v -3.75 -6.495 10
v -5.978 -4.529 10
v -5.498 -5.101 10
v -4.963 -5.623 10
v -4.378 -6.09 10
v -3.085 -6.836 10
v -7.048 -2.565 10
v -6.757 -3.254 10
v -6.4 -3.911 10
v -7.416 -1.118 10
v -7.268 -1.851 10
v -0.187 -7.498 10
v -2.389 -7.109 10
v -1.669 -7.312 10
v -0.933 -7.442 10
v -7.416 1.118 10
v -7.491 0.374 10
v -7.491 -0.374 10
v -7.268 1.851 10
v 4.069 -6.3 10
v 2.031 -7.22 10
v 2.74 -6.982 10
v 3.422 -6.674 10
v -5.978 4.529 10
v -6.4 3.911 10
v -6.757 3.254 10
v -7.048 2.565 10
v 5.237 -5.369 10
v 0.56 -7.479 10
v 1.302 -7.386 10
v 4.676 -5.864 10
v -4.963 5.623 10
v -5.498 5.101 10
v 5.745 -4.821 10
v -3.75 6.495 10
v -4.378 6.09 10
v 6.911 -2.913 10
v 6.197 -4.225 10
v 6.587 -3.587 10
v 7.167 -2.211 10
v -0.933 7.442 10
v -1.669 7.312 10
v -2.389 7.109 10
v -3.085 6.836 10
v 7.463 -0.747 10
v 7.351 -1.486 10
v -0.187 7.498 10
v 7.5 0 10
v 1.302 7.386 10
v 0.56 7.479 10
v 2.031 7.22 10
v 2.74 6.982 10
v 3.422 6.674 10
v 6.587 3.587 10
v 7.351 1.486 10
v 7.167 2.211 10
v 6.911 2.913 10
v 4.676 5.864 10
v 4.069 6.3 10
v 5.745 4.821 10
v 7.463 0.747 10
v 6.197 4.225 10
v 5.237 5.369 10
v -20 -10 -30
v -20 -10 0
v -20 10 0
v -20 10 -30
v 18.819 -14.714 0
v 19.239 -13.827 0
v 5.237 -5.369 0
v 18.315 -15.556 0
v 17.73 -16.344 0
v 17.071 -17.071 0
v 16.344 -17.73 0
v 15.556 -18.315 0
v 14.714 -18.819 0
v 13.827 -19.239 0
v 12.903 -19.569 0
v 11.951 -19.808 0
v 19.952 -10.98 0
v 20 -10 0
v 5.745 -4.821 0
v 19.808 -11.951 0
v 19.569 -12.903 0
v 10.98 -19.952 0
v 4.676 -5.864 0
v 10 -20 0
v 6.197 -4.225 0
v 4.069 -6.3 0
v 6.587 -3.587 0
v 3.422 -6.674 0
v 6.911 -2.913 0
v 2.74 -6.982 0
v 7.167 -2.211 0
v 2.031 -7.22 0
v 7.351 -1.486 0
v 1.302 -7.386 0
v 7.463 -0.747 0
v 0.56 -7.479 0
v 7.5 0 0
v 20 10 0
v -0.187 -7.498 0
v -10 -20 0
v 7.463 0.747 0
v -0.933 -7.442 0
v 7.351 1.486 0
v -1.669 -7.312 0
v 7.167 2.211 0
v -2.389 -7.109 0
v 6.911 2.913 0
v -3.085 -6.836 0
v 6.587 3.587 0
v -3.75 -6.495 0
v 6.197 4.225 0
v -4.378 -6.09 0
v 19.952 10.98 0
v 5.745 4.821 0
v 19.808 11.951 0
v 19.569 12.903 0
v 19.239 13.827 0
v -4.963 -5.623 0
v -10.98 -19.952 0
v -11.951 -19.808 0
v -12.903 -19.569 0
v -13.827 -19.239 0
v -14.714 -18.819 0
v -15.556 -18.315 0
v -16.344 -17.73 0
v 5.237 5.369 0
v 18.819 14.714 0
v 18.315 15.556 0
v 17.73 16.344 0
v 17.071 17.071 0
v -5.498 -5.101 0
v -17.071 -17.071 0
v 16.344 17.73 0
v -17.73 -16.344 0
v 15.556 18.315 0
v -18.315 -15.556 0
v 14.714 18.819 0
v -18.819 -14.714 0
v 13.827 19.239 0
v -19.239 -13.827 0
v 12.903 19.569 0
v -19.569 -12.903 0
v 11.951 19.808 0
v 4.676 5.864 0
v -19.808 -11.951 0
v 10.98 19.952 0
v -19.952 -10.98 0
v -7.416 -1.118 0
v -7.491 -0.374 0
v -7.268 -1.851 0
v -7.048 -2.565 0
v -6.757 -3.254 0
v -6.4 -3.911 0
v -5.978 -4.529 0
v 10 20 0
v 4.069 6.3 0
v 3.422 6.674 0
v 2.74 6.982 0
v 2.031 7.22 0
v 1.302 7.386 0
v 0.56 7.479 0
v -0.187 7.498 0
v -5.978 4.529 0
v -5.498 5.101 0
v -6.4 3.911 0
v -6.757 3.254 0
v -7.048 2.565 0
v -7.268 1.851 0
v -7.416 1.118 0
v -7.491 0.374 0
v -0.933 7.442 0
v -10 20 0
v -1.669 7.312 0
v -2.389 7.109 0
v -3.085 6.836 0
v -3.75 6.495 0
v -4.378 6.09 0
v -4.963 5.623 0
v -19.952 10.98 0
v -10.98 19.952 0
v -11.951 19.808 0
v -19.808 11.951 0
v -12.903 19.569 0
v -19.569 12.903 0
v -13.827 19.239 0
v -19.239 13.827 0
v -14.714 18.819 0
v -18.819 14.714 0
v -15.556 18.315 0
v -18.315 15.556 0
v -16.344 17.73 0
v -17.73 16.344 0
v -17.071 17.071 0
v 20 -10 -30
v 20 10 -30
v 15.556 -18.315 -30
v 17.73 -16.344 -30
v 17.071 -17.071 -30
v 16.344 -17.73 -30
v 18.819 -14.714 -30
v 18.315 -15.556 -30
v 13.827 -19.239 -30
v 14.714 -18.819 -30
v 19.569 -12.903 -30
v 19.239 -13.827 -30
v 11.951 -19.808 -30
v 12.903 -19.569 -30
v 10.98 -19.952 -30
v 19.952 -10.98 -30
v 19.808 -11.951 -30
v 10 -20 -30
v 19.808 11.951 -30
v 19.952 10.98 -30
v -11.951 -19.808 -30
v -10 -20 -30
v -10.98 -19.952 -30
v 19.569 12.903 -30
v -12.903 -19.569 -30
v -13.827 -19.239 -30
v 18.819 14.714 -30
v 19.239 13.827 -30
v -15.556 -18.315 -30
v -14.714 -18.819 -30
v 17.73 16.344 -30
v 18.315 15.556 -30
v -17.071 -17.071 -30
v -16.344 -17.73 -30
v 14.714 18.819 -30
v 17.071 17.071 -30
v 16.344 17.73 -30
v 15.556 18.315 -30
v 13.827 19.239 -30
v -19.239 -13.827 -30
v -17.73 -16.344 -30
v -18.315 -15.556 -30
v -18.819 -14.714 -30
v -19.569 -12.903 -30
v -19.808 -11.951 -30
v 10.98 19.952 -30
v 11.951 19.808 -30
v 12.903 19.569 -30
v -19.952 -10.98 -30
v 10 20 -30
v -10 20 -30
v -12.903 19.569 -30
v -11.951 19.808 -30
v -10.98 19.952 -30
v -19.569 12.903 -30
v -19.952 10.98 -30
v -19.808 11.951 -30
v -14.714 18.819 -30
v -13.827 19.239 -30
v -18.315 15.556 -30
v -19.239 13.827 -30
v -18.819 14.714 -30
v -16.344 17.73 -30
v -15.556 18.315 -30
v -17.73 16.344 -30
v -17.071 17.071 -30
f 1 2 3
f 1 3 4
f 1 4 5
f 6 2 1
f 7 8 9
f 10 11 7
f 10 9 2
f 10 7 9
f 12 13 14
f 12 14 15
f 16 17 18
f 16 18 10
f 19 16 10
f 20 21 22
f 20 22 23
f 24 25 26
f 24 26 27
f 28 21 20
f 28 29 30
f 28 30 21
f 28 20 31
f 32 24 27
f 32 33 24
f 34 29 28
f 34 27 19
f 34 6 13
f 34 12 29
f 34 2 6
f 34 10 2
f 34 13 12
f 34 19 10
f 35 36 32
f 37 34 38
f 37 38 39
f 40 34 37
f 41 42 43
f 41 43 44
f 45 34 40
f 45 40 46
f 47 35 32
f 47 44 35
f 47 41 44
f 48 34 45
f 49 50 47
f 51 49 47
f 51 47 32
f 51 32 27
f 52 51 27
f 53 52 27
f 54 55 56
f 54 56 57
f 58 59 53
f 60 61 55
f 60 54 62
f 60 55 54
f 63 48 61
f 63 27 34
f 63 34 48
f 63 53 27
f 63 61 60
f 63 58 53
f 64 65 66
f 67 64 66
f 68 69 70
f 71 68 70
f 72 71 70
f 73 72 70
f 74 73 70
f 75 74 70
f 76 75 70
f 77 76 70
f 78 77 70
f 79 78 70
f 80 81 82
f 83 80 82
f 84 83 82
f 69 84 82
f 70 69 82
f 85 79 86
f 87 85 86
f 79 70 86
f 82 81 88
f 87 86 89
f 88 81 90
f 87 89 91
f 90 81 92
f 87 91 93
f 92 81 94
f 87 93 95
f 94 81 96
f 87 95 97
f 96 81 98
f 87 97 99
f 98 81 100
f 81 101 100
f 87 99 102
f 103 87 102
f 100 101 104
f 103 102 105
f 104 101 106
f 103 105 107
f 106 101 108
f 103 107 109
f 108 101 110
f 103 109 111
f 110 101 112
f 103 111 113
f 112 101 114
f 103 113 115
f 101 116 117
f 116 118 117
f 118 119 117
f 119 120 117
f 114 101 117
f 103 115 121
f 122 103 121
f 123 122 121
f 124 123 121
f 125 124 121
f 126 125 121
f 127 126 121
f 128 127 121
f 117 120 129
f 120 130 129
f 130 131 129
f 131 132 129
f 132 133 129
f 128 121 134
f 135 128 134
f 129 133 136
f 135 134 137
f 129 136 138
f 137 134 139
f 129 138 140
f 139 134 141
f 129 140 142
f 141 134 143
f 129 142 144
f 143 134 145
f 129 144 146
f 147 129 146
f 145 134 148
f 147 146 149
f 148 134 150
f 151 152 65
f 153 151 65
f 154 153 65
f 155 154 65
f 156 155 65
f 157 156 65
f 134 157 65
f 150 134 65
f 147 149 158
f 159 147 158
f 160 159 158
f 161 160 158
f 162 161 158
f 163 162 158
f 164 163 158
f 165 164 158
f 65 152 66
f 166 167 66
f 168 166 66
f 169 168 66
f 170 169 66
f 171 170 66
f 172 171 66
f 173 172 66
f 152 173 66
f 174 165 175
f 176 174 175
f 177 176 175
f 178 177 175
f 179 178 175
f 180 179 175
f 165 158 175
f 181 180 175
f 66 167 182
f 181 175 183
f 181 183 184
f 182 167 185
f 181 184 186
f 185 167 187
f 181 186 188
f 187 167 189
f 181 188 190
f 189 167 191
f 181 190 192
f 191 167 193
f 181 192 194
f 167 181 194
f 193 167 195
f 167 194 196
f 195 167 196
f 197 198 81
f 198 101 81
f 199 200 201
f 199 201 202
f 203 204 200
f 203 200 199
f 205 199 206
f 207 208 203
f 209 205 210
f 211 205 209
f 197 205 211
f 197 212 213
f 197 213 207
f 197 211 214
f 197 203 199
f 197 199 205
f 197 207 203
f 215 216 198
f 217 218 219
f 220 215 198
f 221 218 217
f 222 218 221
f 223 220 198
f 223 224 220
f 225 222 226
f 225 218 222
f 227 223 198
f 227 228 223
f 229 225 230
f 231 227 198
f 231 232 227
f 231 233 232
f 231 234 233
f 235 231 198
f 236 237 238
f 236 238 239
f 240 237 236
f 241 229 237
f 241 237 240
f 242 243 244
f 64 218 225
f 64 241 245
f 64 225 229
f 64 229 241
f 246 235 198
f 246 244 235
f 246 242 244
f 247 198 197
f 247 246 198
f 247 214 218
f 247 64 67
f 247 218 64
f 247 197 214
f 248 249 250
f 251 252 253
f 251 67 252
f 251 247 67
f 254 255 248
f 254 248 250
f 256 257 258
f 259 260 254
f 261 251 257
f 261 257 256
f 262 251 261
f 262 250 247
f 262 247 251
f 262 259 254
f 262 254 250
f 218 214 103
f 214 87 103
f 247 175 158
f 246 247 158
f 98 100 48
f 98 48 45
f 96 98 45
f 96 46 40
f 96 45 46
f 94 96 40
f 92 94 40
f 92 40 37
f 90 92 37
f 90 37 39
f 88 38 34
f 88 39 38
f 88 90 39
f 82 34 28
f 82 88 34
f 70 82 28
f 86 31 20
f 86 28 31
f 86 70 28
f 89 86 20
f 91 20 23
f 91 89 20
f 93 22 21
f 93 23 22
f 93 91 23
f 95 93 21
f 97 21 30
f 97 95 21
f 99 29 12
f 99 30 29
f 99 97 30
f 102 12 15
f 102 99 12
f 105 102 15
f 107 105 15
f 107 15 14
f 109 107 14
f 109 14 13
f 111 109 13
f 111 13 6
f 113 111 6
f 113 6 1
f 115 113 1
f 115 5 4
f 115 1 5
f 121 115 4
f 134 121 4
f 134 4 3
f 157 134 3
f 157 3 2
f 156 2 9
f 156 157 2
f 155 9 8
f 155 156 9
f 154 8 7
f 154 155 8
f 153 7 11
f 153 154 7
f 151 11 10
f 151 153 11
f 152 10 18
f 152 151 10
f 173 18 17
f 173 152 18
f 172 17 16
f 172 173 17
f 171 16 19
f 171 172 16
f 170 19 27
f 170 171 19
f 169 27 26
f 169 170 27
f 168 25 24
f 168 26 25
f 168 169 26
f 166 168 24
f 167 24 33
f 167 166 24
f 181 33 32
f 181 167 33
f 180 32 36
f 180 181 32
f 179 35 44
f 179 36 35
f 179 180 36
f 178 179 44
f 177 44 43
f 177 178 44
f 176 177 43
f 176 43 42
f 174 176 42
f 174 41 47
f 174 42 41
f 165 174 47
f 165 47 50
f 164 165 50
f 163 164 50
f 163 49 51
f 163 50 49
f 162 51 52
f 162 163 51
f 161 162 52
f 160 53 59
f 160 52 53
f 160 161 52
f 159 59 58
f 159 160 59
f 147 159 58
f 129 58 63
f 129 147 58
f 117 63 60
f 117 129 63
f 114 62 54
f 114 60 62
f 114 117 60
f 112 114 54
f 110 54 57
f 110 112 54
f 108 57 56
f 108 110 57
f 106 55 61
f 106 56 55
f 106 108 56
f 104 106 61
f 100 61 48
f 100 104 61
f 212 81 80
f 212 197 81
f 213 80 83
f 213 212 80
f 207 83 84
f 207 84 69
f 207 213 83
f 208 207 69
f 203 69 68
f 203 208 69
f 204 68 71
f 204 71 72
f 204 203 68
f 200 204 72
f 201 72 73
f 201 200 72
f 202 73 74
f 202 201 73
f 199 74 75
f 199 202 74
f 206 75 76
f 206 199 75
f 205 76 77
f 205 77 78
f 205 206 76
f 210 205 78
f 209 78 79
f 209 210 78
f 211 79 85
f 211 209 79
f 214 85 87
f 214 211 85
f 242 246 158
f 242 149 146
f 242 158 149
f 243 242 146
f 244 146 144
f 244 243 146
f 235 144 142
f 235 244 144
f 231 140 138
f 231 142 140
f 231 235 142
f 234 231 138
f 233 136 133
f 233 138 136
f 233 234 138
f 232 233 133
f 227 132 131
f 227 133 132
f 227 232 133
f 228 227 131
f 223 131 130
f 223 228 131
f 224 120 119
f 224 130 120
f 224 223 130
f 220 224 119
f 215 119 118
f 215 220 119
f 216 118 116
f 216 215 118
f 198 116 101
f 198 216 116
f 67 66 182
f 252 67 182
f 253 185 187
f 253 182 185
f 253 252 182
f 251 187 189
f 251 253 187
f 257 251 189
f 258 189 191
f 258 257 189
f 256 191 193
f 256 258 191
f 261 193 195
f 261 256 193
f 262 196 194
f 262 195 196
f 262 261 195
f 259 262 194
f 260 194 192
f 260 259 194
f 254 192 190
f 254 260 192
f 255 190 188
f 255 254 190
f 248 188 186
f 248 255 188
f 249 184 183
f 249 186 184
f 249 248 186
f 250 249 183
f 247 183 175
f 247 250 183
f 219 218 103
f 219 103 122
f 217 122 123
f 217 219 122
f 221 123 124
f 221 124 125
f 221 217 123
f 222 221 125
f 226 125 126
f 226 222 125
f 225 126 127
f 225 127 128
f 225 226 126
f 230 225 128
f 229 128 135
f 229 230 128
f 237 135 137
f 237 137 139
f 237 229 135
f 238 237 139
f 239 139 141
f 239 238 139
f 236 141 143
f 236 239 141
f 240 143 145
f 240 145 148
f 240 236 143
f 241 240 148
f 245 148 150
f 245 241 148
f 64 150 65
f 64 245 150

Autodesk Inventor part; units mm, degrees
ref_plane "YZ Plane" through (0, 0, 0) normal (1, 0, 0) x (0, 1, 0)
ref_plane "XZ Plane" through (0, 0, 0) normal (0, 1, 0) x (-1, 0, 0)
ref_plane "XY Plane" through (0, 0, 0) normal (0, 0, 1) x (1, 0, 0)
sketch "Sketch1" plane through (0, 0, 0) normal (0, 0, 1) x (1, 0, 0)
  circle A0 centre (0, 0) radius 7.5
  dimension "d0" = 15
extrude "Extrusion1" add sketch "Sketch1" along normal blind 10
sketch "Sketch2" plane through (0, 0, 0) normal (0, 0, -1) x (-1, 0, 0)
  line L0 (-20, -20) -> (20, -20)
  line L1 (20, -20) -> (20, 20)
  line L2 (20, 20) -> (-20, 20)
  line L3 (-20, 20) -> (-20, -20)
  line L4 (-20, -20) -> (20, 20) construction
  line L5 (20, -20) -> (-20, 20) construction
  point P0 (0, 0)
  dimension "d3" = 40
  dimension "d4" = 40
extrude "Extrusion2" add sketch "Sketch2" along normal blind 30
fillet "Fillet1" radius 10 4 edges at (-20, 20, -15) (-20, -20, -15) (20, -20, -15) (20, 20, -15)
equation "\"d4\" = d3"
properties part number "MotorEslabon" material "Steel"
